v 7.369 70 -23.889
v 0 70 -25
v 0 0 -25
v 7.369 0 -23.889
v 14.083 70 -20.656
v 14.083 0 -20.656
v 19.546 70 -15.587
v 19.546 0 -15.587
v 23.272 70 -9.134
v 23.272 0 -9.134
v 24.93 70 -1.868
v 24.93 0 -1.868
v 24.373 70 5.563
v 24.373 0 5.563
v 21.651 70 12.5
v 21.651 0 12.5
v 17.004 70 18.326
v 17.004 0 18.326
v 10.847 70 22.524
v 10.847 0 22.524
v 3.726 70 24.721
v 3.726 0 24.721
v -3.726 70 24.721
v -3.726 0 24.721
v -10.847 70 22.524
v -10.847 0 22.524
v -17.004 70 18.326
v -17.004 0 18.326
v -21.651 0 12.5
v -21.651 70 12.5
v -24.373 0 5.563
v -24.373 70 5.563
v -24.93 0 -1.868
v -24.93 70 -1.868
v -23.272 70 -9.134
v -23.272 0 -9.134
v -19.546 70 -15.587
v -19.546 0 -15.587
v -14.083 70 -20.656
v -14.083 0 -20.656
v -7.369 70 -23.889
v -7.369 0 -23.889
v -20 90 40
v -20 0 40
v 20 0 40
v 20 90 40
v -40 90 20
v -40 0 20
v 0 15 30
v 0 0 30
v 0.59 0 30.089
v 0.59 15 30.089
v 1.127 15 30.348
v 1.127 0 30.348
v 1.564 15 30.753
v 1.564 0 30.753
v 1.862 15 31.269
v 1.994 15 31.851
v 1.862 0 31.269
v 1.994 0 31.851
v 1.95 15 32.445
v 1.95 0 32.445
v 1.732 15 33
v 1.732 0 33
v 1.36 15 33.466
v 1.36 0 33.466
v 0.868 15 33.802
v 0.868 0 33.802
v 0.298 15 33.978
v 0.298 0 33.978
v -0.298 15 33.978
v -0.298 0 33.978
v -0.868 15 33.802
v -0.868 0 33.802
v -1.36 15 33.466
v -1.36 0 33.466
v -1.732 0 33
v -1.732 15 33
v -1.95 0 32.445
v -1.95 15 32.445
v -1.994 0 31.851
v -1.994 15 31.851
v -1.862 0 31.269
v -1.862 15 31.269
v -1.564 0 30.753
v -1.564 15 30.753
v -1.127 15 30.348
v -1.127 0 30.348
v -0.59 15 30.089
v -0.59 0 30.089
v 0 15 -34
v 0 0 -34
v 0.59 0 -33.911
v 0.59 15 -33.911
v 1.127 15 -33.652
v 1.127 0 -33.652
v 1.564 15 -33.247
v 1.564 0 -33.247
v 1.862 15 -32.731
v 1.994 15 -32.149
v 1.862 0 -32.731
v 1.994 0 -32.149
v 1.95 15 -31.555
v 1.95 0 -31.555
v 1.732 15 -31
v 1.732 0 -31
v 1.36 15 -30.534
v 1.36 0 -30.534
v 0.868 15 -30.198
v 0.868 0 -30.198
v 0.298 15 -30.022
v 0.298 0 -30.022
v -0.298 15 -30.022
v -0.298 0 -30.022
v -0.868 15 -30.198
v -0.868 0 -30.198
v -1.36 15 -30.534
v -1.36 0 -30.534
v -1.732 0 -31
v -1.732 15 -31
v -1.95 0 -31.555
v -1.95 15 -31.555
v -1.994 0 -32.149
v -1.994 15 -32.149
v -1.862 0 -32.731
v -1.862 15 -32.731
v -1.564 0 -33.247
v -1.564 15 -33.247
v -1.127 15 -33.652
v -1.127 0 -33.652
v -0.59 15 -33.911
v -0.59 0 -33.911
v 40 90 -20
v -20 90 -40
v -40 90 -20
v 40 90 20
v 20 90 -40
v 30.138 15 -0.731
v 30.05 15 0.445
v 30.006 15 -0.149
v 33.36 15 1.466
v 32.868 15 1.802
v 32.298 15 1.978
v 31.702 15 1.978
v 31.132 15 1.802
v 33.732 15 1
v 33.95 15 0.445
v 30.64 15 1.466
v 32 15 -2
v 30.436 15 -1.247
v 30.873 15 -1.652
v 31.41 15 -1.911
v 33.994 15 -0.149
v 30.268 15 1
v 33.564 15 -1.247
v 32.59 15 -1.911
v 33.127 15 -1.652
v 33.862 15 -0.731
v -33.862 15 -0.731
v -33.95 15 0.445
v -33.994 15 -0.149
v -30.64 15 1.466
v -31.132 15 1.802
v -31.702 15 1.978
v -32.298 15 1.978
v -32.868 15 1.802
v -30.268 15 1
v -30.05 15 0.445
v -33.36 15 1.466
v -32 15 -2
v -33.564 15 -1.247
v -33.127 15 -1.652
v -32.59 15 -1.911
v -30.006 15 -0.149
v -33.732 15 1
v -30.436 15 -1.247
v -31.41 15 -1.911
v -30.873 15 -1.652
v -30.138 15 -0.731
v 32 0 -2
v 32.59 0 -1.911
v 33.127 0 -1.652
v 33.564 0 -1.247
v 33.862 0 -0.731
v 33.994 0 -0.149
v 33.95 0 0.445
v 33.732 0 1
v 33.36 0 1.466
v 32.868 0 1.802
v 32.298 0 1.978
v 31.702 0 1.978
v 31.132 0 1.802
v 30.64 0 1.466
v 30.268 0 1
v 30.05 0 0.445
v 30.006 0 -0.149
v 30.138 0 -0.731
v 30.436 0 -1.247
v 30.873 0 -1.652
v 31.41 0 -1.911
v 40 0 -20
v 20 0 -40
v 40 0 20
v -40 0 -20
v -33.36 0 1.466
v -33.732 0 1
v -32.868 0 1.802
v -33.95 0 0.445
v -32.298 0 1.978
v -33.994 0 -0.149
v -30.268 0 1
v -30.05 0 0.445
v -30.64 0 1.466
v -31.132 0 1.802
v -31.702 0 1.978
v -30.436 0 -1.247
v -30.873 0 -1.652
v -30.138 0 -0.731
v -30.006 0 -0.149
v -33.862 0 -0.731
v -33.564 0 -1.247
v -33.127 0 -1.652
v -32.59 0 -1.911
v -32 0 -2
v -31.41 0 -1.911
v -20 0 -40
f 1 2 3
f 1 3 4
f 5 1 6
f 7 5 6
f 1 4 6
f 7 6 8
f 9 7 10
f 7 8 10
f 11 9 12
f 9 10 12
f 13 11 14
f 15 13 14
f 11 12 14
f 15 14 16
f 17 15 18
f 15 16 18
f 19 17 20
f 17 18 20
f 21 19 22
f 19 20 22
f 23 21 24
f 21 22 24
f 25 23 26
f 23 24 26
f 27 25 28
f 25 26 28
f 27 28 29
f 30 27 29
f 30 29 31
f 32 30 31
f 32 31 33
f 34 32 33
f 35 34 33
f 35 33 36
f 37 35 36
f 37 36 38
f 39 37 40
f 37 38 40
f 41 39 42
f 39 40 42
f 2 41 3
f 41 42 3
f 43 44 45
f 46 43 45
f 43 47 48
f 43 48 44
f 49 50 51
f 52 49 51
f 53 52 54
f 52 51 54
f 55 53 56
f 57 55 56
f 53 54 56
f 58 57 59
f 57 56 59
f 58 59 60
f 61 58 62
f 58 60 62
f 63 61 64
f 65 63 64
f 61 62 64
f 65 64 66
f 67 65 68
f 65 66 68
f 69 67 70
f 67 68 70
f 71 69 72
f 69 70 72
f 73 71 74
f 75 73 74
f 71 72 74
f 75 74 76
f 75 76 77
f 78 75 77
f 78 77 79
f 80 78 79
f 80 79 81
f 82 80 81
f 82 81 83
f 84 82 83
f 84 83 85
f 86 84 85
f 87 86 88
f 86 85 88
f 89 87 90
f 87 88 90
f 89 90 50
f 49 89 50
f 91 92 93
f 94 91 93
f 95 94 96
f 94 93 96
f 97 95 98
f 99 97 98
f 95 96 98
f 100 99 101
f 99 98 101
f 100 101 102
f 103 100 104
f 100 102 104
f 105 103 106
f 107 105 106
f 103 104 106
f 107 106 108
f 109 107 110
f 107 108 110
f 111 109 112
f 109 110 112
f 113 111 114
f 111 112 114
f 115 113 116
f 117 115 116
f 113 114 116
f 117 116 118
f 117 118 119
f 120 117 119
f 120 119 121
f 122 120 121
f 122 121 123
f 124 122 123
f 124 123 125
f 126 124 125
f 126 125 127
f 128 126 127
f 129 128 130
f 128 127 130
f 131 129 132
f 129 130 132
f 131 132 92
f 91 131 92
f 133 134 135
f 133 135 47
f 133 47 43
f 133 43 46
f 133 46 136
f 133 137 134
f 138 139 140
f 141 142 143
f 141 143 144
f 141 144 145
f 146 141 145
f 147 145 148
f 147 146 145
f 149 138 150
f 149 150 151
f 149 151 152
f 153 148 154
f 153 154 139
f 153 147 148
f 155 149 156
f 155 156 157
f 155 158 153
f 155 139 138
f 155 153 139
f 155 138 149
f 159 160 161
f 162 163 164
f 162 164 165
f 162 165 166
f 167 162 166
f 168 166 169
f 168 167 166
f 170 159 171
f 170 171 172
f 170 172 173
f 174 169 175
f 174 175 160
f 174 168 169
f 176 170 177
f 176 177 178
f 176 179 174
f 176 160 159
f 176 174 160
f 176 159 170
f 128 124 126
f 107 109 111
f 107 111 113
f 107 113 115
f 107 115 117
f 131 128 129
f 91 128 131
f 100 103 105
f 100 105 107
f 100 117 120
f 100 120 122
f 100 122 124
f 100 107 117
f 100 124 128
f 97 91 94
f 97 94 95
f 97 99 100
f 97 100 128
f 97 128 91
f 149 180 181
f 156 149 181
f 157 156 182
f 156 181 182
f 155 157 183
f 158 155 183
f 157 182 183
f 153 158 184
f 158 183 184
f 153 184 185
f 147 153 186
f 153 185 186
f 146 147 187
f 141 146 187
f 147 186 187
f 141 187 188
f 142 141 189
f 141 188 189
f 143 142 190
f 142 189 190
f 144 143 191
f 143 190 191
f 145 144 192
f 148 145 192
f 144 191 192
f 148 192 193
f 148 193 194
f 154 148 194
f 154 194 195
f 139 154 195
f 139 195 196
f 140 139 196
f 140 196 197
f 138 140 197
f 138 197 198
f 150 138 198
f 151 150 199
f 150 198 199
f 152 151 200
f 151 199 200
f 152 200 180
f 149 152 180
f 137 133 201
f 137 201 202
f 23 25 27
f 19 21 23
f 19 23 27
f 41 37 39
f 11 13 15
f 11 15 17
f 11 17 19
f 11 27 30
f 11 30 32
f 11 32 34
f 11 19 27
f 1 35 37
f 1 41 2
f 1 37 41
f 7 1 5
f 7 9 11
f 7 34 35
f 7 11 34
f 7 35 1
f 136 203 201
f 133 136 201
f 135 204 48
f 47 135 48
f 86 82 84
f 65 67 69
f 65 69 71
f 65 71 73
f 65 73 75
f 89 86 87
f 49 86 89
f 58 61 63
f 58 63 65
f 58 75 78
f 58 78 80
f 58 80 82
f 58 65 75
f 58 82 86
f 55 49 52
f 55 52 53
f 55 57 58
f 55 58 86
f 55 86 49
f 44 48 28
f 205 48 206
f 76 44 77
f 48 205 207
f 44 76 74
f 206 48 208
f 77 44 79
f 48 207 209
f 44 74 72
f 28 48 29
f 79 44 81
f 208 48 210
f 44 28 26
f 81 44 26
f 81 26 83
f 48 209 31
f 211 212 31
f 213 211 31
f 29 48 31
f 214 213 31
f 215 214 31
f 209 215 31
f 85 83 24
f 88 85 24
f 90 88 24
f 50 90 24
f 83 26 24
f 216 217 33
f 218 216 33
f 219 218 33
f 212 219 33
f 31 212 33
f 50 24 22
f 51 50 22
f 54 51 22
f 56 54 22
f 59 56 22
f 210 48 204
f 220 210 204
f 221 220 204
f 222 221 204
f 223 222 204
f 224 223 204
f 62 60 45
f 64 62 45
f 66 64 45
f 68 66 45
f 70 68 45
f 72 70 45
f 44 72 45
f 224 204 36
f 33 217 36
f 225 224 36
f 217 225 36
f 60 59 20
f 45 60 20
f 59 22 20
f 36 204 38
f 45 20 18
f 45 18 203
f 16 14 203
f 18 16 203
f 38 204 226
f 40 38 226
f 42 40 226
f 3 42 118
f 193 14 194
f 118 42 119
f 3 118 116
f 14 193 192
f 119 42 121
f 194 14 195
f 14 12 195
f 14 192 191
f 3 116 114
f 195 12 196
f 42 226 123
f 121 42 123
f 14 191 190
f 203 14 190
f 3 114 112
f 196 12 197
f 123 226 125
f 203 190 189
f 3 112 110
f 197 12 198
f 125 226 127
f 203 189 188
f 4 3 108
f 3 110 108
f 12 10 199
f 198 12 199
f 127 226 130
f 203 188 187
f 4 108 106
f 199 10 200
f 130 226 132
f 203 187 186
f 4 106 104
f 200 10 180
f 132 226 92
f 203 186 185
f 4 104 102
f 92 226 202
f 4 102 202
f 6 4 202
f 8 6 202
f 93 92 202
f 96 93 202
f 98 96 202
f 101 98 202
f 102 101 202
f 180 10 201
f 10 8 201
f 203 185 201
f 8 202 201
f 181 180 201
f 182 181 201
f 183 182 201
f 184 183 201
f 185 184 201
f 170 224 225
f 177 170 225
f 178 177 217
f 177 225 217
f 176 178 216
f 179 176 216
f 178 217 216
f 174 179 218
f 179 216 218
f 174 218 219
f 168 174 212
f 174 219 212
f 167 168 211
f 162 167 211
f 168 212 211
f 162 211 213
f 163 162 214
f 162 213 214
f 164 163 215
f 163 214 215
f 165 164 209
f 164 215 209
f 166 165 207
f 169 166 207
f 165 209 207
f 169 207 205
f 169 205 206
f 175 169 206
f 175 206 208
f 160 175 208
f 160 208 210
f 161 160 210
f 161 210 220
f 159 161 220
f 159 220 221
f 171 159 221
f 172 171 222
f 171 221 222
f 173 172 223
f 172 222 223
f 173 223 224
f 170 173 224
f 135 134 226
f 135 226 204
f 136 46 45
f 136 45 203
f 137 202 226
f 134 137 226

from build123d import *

# Parameters (mm, degrees)
BOSS_EXTRU_1_DEPTH      = 90
ESQUISSE3_R             = 25
ENL_V_MAT_EXTRU_1_DEPTH = 70
ESQUISSE5_R             = 2
ENL_V_MAT_EXTRU_3_DEPTH = 15


with BuildPart() as part:
    # Esquisse2 → Boss.-Extru.1 (new body)
    with BuildSketch(Plane(origin=(0, 0, 0), x_dir=(1, 0, 0), z_dir=(0, 1, 0))):
        Polygon((-20, 40), (-40, 20), (-40, -20), (-20, -40), (20, -40), (40, -20), (40, 20), (20, 40), align=None)
    extrude(amount=BOSS_EXTRU_1_DEPTH)

    # Esquisse3 → Enlèv. mat.-Extru.1 (cut)
    with BuildSketch(Plane.XZ):
        with Locations(Location((0, 0, 0), (0, 0, 270))):
            Circle(ESQUISSE3_R)
    extrude(amount=-ENL_V_MAT_EXTRU_1_DEPTH, mode=Mode.SUBTRACT)

    # Esquisse5 → Enlèv. mat.-Extru.3 (cut)
    with BuildSketch(Plane.XZ):
        with Locations(Location((-32, 0, 0), (0, 0, 270))):
            Circle(ESQUISSE5_R)
        with Locations(Location((0, -32, 0), (0, 0, 270))):
            Circle(ESQUISSE5_R)
        with Locations(Location((32, 0, 0), (0, 0, 270))):
            Circle(ESQUISSE5_R)
        with Locations(Location((0, 32, 0), (0, 0, 270))):
            Circle(ESQUISSE5_R)
    extrude(amount=-ENL_V_MAT_EXTRU_3_DEPTH, mode=Mode.SUBTRACT)


solid = part.part
